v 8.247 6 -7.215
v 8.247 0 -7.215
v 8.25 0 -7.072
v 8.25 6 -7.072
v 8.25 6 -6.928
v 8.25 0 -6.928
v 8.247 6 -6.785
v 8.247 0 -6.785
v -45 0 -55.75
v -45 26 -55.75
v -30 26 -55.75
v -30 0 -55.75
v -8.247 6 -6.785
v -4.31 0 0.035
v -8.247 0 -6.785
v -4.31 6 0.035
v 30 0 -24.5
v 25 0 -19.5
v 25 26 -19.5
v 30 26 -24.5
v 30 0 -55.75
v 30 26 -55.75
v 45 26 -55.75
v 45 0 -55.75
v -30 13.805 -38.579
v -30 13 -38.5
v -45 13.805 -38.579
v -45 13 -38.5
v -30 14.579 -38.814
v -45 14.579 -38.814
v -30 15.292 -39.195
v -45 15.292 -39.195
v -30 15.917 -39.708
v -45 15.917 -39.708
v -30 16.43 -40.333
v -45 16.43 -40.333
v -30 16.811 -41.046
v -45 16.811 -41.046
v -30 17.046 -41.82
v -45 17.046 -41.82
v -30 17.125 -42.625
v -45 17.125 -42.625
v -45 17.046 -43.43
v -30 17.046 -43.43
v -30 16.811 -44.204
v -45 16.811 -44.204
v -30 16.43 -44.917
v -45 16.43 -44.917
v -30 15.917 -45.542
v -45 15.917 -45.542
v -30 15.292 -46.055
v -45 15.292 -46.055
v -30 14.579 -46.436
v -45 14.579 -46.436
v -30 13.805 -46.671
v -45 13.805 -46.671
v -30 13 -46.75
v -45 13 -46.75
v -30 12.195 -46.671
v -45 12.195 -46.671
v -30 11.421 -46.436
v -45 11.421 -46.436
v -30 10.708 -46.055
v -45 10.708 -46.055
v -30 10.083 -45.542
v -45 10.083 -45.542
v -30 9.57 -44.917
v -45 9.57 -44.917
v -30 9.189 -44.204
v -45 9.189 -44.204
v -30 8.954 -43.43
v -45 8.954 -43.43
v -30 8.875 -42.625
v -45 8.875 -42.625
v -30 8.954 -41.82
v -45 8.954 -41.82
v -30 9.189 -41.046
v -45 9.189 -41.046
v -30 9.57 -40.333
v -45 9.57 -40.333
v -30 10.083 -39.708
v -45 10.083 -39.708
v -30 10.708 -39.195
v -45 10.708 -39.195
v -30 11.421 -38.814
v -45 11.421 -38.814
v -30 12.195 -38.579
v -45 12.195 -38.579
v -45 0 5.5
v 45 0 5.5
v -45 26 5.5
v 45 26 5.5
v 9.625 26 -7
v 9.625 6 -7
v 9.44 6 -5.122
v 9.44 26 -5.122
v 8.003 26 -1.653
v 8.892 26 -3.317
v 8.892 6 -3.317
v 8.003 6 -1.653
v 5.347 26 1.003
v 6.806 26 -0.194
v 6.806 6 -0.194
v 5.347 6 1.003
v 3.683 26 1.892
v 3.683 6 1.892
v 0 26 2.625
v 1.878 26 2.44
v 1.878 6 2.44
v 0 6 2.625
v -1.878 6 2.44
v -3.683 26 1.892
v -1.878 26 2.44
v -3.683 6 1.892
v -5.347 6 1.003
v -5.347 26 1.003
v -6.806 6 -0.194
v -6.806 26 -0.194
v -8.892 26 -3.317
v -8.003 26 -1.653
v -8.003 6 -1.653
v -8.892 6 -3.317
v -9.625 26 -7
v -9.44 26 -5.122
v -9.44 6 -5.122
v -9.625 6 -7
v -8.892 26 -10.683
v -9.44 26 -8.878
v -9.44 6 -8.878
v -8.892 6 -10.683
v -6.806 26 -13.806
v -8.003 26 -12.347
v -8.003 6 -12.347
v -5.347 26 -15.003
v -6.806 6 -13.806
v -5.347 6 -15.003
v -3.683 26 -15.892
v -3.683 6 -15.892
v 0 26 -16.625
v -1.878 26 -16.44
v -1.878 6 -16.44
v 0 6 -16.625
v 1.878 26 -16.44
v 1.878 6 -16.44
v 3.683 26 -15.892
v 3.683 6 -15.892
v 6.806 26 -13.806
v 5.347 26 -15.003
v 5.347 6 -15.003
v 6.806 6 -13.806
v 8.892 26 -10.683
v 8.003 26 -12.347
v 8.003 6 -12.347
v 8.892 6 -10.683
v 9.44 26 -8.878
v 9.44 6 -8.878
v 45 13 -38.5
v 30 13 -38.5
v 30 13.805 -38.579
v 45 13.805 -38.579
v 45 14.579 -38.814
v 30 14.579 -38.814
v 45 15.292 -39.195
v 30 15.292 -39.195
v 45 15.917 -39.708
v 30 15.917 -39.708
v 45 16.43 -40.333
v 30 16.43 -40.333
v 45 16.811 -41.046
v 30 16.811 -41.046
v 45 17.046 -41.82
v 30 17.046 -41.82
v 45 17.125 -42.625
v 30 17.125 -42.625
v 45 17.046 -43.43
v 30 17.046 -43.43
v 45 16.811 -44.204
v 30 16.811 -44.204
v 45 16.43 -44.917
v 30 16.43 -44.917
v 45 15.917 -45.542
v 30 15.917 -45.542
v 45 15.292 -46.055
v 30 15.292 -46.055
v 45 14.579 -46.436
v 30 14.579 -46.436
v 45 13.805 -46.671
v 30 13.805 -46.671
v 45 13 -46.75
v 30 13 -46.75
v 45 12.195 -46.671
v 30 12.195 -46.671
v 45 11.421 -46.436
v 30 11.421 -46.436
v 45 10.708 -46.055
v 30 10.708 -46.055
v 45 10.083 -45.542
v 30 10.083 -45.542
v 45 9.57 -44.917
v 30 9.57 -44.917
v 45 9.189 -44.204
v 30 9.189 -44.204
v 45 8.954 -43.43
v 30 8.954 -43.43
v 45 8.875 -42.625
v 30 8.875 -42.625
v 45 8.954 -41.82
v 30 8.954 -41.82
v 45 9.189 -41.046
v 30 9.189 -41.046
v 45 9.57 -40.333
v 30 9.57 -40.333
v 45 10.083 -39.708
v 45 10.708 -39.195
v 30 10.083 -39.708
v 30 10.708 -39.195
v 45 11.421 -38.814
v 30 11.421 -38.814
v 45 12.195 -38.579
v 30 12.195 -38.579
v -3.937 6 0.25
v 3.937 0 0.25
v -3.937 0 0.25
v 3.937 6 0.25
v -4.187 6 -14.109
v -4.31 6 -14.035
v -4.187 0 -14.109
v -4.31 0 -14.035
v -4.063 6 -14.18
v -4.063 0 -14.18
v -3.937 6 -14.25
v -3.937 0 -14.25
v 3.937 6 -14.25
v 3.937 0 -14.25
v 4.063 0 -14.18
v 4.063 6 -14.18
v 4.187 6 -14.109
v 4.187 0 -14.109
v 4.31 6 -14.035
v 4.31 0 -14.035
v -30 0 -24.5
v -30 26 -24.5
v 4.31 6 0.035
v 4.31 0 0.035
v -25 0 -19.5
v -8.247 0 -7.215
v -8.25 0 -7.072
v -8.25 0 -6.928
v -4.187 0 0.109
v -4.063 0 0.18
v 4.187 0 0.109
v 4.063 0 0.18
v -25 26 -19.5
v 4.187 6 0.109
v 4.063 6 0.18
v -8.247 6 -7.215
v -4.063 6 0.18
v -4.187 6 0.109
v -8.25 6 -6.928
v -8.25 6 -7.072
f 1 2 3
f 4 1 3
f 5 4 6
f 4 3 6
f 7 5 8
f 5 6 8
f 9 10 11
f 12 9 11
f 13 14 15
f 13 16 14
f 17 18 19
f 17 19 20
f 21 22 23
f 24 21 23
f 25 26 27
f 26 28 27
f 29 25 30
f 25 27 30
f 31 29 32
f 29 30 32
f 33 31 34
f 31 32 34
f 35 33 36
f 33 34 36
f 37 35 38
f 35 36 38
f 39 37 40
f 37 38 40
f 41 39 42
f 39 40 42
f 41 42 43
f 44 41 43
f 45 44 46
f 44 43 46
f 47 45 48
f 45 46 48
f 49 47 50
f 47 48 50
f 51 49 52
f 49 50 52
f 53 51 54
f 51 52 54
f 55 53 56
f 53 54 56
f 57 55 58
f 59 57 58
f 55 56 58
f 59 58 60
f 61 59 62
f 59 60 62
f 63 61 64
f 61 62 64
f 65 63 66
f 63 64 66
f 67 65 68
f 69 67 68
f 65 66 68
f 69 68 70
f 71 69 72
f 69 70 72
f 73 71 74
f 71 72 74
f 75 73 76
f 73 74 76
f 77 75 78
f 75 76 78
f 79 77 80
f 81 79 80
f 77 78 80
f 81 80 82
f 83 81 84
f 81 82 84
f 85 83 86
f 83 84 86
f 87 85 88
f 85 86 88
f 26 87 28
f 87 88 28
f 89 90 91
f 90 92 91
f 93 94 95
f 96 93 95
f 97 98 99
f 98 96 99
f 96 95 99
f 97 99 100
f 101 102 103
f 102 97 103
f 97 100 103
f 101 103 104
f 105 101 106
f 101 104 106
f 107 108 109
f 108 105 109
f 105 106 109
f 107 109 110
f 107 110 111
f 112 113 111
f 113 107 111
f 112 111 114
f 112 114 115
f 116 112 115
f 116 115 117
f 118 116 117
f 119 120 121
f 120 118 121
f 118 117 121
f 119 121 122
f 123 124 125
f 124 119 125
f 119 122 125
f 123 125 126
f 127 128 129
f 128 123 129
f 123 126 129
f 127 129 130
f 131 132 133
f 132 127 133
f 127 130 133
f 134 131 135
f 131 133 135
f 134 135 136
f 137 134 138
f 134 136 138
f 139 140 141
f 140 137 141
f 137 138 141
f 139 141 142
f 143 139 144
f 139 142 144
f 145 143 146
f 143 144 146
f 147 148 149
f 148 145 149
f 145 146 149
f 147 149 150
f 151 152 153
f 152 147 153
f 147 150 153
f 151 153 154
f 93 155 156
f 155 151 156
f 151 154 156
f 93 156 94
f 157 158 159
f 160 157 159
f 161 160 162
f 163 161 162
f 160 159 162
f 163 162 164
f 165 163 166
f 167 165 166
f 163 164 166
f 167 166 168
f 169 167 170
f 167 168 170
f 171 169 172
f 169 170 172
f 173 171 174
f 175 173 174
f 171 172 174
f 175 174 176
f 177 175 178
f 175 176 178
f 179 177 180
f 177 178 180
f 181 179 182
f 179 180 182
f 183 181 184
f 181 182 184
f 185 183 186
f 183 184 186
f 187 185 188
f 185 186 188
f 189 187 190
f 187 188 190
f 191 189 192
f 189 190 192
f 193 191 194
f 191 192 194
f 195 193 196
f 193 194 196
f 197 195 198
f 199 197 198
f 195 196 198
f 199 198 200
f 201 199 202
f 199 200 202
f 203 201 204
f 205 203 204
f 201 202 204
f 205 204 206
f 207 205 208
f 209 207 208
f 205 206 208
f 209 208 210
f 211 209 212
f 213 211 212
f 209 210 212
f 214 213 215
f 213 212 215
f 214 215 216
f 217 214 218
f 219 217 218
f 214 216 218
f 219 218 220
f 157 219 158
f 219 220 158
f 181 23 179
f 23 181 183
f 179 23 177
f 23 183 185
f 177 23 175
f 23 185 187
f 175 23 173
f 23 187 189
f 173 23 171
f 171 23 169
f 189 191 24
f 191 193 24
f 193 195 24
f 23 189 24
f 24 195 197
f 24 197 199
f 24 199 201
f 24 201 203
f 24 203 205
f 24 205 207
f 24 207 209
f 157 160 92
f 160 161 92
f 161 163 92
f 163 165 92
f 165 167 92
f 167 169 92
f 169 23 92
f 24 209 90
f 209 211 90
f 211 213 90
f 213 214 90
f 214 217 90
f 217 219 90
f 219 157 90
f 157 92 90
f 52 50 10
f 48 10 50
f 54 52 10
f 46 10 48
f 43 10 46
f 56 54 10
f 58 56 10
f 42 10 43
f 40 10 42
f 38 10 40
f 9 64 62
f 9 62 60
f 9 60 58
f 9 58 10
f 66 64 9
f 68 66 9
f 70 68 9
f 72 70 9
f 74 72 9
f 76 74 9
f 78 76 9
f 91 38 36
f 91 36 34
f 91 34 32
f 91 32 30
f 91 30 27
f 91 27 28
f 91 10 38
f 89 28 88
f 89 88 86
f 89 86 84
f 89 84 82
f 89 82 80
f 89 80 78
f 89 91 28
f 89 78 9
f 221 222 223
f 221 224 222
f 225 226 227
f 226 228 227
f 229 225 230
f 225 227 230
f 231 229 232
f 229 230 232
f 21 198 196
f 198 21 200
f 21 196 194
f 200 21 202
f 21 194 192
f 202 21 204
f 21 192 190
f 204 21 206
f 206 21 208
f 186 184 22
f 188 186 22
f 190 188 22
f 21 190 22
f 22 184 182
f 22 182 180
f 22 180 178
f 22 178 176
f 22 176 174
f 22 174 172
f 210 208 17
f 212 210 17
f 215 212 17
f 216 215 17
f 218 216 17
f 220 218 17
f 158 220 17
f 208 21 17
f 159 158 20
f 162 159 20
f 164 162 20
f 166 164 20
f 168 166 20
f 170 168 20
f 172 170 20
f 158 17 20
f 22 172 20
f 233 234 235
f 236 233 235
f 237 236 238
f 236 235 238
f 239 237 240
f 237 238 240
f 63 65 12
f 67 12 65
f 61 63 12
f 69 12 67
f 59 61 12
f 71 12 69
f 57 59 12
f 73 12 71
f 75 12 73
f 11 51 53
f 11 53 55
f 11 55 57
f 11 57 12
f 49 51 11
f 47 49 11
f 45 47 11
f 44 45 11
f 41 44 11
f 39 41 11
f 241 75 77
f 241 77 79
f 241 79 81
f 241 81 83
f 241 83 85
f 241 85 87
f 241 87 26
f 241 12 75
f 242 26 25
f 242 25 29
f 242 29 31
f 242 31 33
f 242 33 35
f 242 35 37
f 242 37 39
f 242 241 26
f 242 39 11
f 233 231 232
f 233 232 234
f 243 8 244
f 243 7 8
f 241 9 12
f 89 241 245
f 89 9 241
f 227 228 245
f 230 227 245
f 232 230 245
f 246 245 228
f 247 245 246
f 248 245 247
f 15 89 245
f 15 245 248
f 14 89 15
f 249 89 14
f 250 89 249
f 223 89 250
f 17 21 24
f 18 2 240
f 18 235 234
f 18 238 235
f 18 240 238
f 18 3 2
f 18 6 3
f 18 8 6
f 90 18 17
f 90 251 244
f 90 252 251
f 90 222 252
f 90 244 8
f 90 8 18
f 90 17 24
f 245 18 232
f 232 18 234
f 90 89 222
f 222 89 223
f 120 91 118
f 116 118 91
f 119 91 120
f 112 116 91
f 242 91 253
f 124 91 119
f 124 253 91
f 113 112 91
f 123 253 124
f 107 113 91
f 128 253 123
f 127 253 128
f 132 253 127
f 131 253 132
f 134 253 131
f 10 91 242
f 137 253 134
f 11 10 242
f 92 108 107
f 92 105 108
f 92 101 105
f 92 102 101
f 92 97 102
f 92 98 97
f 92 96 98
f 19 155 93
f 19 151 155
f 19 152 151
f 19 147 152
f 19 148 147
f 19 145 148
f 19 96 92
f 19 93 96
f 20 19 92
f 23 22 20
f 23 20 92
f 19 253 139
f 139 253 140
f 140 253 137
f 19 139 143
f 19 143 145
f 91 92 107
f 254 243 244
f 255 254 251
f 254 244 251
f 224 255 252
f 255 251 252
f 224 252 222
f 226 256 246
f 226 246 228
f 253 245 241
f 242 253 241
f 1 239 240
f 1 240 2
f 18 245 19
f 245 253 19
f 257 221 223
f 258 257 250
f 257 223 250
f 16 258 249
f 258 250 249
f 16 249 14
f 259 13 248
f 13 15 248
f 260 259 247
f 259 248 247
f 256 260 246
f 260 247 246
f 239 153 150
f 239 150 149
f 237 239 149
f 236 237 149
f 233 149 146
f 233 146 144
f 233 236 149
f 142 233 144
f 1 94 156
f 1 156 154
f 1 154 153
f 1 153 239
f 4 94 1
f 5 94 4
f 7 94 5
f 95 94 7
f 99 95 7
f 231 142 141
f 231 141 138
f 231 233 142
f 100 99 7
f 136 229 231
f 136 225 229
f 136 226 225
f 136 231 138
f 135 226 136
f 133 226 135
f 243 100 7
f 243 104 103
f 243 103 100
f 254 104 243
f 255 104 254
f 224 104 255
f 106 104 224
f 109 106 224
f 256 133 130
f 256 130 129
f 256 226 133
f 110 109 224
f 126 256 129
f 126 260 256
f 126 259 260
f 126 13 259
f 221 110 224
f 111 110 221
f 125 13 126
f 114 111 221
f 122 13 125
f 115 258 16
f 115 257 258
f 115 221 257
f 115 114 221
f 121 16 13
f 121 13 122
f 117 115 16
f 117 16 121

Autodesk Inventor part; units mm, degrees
ref_plane "YZ Plane" through (0, 0, 0) normal (1, 0, 0) x (0, 1, 0)
ref_plane "XZ Plane" through (0, 0, 0) normal (0, 1, 0) x (-1, 0, 0)
ref_plane "XY Plane" through (0, 0, 0) normal (0, 0, 1) x (1, 0, 0)
sketch "Sketch1" plane through (0, 0, 0) normal (0, 1, 0) x (-1, 0, 0)
  line L0 (0, 0) -> (0, -14)
  circle A0 centre (0, -7) radius 8.25
  circle A1 centre (0, -7) radius 10.5
  dimension "d0" = 14
  dimension "d1" = 16.5
  dimension "d2" = 21
extrude "Extrusion1" add sketch "Sketch1" along normal blind 6
sketch "Sketch2" plane through (0, 6, -7) normal (0, 1, 0) x (1, 0, 0)
  line L0 (10.5, -10.5) -> (-10.5, -10.5)
  line L1 (-10.5, -10.5) -> (-10.5, 10.5)
  line L2 (-10.5, 10.5) -> (10.5, 10.5)
  line L3 (10.5, 10.5) -> (10.5, -10.5)
  line L4 (10.5, -10.5) -> (-10.5, 10.5) construction
  line L5 (-10.5, -10.5) -> (10.5, 10.5) construction
  circle A0 centre (0, 0) radius 10.5
  point P0 (0, -7)
extrude "Extrusion2" add sketch "Sketch2" against normal blind 6 contours L0 A0 L3 | L0 L1 A0 | A0 L2 L3 | L1 L2 A0
sketch "Sketch4" plane through (0, 6, 0) normal (0, 1, 0) x (1, 0, 0)
  circle A0 centre (0, 7) radius 8.25 projected
  line L0 (0, 7) -> (0, -0.25)
  line L1 (0, -0.25) -> (-3.937, -0.25)
  line L2 (3.937, -0.25) -> (-3.937, -0.25)
  point P0 (0, 0)
  dimension "d14" = 7.25
extrude "Extrusion4" add sketch "Sketch4" against normal blind 6 contours L1 L2 A0 picked at (1.9893, -0.4987)
pattern_circular "Circular Pattern2" count 6 over 360 about axis through (0, 0, -7) along (0, 1, 0) of "Extrusion4"
sketch "Sketch5" plane through (0, 6, 0) normal (0, 1, 0) x (1, 0, 0)
  line L0 (-4.3102, -0.0345) -> (-8.2472, 6.7845) projected
  line L1 (-6.2787, 3.375) -> (6.2787, 10.625)
  line L2 (4.3102, 14.0345) -> (8.2472, 7.2155) projected
  line L3 (8.2472, 6.7845) -> (4.3102, -0.0345) projected
  line L4 (6.2787, 3.375) -> (-6.2787, 10.625)
  line L5 (-4.3102, 14.0345) -> (-8.2472, 7.2155) projected
  line L6 (3.937, 14.25) -> (-3.937, 14.25) projected
  line L7 (0, 14.25) -> (0, -0.25)
  line L8 (3.937, -0.25) -> (-3.937, -0.25) projected
  circle A0 centre (0, 7) radius 9.625
  line L9 (12.5, 19.5) -> (-12.5, 19.5)
  line L10 (-12.5, 19.5) -> (-12.5, -5.5)
  line L11 (-12.5, -5.5) -> (12.5, -5.5)
  line L12 (12.5, -5.5) -> (12.5, 19.5)
  line L13 (12.5, 19.5) -> (-12.5, -5.5) construction
  line L14 (-12.5, 19.5) -> (12.5, -5.5) construction
  point P0 (0, 0)
  dimension "d20" = 19.25
  dimension "d21" = 25
  dimension "d22" = 25
extrude "Extrusion5" add sketch "Sketch5" along normal blind 20
sketch "Sketch6" plane through (0, 6, 0) normal (0, -1, 0) x (1, 0, 0)
  line L0 (-10.5, -17.5) -> (10.5, -17.5)
  line L1 (10.5, -17.5) -> (10.5, 3.5)
  line L2 (10.5, 3.5) -> (-10.5, 3.5)
  line L3 (-10.5, 3.5) -> (-10.5, -17.5)
  circle A0 centre (0, -7) radius 9.625 projected
  line L4 (-10.5, -17.5) -> (10.5, 3.5) construction
  line L5 (10.5, -17.5) -> (-10.5, 3.5) construction
  line L6 (-12.5, -19.5) -> (12.5, -19.5)
  line L7 (12.5, -19.5) -> (12.5, 5.5)
  line L8 (12.5, 5.5) -> (-12.5, 5.5)
  line L9 (-12.5, 5.5) -> (-12.5, -19.5)
  line L10 (-12.5, -19.5) -> (12.5, 5.5) construction
  line L11 (12.5, -19.5) -> (-12.5, 5.5) construction
  point P0 (0, 0)
extrude "Extrusion6" add sketch "Sketch6" along normal blind 6 contours L9 L8 L7 L6
sketch "Sketch8" plane through (-12.5, 26, 5.5) normal (0, 0, 1) x (1, 0, 0)
  line L0 (0, 0) -> (25, 0)
  line L1 (0, 0) -> (-17.5, 0)
  line L2 (25, 0) -> (42.5, 0)
  line L3 (0, 0) -> (-17.5, 0)
  line L4 (-17.5, 0) -> (-17.5, -26)
  line L5 (-17.5, -26) -> (0, -26)
  line L6 (0, -26) -> (0, 0)
  line L7 (25, 0) -> (42.5, 0)
  line L8 (42.5, 0) -> (42.5, -26)
  line L9 (42.5, -26) -> (25, -26)
  line L10 (25, -26) -> (25, 0)
  point P0 (12.5, -26)
  dimension "d27" = 17.5
  dimension "d28" = 17.5
extrude "Extrusion7" add sketch "Sketch8" against normal blind 25
sketch "Sketch9" plane through (-30, 0, 5.5) normal (0, 0, 1) x (1, 0, 0)
  line L0 (0, 26) -> (-15, 26)
  line L1 (-15, 26) -> (-15, 0)
  line L2 (-15, 0) -> (0, 0)
  line L3 (0, 0) -> (0, 26)
  line L4 (60, 26) -> (75, 26)
  line L5 (75, 26) -> (75, 0)
  line L6 (75, 0) -> (60, 0)
  line L7 (60, 0) -> (60, 26)
  point P0 (30, 0)
  dimension "d31" = 15
  dimension "d32" = 15
extrude "Extrusion8" add sketch "Sketch9" against normal blind 61.25
sketch "Sketch10" plane through (-45, 0, 5.5) normal (-1, 0, 0) x (0, 0, 1)
  line L0 (-61.25, 0) -> (-61.25, 26) projected
  line L1 (-61.25, 13) -> (-35, 13)
  circle A0 centre (-48.125, 13) radius 4.125
  point P0 (-5.5, 0)
  dimension "d35" = 26.25
  dimension "d36" = 8.25
extrude "Extrusion9" cut sketch "Sketch10" against normal through all
sketch "Sketch11" plane through (0, 26, 0) normal (0, 1, 0) x (1, 0, 0)
  line L0 (30, 19.5) -> (30, 24.5)
  line L1 (30, 19.5) -> (30, 55.75) projected
  line L2 (30, 19.5) -> (25, 19.5)
  line L3 (25, 19.5) -> (30, 24.5)
  line L4 (-30, 19.5) -> (-30, 24.5)
  line L5 (-30, 19.5) -> (-30, 55.75) projected
  line L6 (-30, 19.5) -> (-25, 19.5)
  line L7 (30, 19.5) -> (-30, 19.5) projected
  line L8 (-25, 19.5) -> (-30, 24.5)
  point P0 (0, 0)
  dimension "d39" = 5
  dimension "d40" = 5
  dimension "d41" = 5
  dimension "d42" = 5
extrude "Extrusion10" add sketch "Sketch11" against normal blind 26
sketch "Sketch12" plane through (0, 26, 0) normal (0, 1, 0) x (1, 0, 0)
  line L0 (-45, -5.5) -> (-45, 55.75) projected
  line L1 (45, -5.5) -> (-45, -5.5)
  line L2 (-45, -5.5) -> (-45, 24.5)
  line L3 (-45, 24.5) -> (45, 24.5)
  line L4 (45, 24.5) -> (45, -5.5)
  point P0 (0, 0)
properties part number "FretterMount"
